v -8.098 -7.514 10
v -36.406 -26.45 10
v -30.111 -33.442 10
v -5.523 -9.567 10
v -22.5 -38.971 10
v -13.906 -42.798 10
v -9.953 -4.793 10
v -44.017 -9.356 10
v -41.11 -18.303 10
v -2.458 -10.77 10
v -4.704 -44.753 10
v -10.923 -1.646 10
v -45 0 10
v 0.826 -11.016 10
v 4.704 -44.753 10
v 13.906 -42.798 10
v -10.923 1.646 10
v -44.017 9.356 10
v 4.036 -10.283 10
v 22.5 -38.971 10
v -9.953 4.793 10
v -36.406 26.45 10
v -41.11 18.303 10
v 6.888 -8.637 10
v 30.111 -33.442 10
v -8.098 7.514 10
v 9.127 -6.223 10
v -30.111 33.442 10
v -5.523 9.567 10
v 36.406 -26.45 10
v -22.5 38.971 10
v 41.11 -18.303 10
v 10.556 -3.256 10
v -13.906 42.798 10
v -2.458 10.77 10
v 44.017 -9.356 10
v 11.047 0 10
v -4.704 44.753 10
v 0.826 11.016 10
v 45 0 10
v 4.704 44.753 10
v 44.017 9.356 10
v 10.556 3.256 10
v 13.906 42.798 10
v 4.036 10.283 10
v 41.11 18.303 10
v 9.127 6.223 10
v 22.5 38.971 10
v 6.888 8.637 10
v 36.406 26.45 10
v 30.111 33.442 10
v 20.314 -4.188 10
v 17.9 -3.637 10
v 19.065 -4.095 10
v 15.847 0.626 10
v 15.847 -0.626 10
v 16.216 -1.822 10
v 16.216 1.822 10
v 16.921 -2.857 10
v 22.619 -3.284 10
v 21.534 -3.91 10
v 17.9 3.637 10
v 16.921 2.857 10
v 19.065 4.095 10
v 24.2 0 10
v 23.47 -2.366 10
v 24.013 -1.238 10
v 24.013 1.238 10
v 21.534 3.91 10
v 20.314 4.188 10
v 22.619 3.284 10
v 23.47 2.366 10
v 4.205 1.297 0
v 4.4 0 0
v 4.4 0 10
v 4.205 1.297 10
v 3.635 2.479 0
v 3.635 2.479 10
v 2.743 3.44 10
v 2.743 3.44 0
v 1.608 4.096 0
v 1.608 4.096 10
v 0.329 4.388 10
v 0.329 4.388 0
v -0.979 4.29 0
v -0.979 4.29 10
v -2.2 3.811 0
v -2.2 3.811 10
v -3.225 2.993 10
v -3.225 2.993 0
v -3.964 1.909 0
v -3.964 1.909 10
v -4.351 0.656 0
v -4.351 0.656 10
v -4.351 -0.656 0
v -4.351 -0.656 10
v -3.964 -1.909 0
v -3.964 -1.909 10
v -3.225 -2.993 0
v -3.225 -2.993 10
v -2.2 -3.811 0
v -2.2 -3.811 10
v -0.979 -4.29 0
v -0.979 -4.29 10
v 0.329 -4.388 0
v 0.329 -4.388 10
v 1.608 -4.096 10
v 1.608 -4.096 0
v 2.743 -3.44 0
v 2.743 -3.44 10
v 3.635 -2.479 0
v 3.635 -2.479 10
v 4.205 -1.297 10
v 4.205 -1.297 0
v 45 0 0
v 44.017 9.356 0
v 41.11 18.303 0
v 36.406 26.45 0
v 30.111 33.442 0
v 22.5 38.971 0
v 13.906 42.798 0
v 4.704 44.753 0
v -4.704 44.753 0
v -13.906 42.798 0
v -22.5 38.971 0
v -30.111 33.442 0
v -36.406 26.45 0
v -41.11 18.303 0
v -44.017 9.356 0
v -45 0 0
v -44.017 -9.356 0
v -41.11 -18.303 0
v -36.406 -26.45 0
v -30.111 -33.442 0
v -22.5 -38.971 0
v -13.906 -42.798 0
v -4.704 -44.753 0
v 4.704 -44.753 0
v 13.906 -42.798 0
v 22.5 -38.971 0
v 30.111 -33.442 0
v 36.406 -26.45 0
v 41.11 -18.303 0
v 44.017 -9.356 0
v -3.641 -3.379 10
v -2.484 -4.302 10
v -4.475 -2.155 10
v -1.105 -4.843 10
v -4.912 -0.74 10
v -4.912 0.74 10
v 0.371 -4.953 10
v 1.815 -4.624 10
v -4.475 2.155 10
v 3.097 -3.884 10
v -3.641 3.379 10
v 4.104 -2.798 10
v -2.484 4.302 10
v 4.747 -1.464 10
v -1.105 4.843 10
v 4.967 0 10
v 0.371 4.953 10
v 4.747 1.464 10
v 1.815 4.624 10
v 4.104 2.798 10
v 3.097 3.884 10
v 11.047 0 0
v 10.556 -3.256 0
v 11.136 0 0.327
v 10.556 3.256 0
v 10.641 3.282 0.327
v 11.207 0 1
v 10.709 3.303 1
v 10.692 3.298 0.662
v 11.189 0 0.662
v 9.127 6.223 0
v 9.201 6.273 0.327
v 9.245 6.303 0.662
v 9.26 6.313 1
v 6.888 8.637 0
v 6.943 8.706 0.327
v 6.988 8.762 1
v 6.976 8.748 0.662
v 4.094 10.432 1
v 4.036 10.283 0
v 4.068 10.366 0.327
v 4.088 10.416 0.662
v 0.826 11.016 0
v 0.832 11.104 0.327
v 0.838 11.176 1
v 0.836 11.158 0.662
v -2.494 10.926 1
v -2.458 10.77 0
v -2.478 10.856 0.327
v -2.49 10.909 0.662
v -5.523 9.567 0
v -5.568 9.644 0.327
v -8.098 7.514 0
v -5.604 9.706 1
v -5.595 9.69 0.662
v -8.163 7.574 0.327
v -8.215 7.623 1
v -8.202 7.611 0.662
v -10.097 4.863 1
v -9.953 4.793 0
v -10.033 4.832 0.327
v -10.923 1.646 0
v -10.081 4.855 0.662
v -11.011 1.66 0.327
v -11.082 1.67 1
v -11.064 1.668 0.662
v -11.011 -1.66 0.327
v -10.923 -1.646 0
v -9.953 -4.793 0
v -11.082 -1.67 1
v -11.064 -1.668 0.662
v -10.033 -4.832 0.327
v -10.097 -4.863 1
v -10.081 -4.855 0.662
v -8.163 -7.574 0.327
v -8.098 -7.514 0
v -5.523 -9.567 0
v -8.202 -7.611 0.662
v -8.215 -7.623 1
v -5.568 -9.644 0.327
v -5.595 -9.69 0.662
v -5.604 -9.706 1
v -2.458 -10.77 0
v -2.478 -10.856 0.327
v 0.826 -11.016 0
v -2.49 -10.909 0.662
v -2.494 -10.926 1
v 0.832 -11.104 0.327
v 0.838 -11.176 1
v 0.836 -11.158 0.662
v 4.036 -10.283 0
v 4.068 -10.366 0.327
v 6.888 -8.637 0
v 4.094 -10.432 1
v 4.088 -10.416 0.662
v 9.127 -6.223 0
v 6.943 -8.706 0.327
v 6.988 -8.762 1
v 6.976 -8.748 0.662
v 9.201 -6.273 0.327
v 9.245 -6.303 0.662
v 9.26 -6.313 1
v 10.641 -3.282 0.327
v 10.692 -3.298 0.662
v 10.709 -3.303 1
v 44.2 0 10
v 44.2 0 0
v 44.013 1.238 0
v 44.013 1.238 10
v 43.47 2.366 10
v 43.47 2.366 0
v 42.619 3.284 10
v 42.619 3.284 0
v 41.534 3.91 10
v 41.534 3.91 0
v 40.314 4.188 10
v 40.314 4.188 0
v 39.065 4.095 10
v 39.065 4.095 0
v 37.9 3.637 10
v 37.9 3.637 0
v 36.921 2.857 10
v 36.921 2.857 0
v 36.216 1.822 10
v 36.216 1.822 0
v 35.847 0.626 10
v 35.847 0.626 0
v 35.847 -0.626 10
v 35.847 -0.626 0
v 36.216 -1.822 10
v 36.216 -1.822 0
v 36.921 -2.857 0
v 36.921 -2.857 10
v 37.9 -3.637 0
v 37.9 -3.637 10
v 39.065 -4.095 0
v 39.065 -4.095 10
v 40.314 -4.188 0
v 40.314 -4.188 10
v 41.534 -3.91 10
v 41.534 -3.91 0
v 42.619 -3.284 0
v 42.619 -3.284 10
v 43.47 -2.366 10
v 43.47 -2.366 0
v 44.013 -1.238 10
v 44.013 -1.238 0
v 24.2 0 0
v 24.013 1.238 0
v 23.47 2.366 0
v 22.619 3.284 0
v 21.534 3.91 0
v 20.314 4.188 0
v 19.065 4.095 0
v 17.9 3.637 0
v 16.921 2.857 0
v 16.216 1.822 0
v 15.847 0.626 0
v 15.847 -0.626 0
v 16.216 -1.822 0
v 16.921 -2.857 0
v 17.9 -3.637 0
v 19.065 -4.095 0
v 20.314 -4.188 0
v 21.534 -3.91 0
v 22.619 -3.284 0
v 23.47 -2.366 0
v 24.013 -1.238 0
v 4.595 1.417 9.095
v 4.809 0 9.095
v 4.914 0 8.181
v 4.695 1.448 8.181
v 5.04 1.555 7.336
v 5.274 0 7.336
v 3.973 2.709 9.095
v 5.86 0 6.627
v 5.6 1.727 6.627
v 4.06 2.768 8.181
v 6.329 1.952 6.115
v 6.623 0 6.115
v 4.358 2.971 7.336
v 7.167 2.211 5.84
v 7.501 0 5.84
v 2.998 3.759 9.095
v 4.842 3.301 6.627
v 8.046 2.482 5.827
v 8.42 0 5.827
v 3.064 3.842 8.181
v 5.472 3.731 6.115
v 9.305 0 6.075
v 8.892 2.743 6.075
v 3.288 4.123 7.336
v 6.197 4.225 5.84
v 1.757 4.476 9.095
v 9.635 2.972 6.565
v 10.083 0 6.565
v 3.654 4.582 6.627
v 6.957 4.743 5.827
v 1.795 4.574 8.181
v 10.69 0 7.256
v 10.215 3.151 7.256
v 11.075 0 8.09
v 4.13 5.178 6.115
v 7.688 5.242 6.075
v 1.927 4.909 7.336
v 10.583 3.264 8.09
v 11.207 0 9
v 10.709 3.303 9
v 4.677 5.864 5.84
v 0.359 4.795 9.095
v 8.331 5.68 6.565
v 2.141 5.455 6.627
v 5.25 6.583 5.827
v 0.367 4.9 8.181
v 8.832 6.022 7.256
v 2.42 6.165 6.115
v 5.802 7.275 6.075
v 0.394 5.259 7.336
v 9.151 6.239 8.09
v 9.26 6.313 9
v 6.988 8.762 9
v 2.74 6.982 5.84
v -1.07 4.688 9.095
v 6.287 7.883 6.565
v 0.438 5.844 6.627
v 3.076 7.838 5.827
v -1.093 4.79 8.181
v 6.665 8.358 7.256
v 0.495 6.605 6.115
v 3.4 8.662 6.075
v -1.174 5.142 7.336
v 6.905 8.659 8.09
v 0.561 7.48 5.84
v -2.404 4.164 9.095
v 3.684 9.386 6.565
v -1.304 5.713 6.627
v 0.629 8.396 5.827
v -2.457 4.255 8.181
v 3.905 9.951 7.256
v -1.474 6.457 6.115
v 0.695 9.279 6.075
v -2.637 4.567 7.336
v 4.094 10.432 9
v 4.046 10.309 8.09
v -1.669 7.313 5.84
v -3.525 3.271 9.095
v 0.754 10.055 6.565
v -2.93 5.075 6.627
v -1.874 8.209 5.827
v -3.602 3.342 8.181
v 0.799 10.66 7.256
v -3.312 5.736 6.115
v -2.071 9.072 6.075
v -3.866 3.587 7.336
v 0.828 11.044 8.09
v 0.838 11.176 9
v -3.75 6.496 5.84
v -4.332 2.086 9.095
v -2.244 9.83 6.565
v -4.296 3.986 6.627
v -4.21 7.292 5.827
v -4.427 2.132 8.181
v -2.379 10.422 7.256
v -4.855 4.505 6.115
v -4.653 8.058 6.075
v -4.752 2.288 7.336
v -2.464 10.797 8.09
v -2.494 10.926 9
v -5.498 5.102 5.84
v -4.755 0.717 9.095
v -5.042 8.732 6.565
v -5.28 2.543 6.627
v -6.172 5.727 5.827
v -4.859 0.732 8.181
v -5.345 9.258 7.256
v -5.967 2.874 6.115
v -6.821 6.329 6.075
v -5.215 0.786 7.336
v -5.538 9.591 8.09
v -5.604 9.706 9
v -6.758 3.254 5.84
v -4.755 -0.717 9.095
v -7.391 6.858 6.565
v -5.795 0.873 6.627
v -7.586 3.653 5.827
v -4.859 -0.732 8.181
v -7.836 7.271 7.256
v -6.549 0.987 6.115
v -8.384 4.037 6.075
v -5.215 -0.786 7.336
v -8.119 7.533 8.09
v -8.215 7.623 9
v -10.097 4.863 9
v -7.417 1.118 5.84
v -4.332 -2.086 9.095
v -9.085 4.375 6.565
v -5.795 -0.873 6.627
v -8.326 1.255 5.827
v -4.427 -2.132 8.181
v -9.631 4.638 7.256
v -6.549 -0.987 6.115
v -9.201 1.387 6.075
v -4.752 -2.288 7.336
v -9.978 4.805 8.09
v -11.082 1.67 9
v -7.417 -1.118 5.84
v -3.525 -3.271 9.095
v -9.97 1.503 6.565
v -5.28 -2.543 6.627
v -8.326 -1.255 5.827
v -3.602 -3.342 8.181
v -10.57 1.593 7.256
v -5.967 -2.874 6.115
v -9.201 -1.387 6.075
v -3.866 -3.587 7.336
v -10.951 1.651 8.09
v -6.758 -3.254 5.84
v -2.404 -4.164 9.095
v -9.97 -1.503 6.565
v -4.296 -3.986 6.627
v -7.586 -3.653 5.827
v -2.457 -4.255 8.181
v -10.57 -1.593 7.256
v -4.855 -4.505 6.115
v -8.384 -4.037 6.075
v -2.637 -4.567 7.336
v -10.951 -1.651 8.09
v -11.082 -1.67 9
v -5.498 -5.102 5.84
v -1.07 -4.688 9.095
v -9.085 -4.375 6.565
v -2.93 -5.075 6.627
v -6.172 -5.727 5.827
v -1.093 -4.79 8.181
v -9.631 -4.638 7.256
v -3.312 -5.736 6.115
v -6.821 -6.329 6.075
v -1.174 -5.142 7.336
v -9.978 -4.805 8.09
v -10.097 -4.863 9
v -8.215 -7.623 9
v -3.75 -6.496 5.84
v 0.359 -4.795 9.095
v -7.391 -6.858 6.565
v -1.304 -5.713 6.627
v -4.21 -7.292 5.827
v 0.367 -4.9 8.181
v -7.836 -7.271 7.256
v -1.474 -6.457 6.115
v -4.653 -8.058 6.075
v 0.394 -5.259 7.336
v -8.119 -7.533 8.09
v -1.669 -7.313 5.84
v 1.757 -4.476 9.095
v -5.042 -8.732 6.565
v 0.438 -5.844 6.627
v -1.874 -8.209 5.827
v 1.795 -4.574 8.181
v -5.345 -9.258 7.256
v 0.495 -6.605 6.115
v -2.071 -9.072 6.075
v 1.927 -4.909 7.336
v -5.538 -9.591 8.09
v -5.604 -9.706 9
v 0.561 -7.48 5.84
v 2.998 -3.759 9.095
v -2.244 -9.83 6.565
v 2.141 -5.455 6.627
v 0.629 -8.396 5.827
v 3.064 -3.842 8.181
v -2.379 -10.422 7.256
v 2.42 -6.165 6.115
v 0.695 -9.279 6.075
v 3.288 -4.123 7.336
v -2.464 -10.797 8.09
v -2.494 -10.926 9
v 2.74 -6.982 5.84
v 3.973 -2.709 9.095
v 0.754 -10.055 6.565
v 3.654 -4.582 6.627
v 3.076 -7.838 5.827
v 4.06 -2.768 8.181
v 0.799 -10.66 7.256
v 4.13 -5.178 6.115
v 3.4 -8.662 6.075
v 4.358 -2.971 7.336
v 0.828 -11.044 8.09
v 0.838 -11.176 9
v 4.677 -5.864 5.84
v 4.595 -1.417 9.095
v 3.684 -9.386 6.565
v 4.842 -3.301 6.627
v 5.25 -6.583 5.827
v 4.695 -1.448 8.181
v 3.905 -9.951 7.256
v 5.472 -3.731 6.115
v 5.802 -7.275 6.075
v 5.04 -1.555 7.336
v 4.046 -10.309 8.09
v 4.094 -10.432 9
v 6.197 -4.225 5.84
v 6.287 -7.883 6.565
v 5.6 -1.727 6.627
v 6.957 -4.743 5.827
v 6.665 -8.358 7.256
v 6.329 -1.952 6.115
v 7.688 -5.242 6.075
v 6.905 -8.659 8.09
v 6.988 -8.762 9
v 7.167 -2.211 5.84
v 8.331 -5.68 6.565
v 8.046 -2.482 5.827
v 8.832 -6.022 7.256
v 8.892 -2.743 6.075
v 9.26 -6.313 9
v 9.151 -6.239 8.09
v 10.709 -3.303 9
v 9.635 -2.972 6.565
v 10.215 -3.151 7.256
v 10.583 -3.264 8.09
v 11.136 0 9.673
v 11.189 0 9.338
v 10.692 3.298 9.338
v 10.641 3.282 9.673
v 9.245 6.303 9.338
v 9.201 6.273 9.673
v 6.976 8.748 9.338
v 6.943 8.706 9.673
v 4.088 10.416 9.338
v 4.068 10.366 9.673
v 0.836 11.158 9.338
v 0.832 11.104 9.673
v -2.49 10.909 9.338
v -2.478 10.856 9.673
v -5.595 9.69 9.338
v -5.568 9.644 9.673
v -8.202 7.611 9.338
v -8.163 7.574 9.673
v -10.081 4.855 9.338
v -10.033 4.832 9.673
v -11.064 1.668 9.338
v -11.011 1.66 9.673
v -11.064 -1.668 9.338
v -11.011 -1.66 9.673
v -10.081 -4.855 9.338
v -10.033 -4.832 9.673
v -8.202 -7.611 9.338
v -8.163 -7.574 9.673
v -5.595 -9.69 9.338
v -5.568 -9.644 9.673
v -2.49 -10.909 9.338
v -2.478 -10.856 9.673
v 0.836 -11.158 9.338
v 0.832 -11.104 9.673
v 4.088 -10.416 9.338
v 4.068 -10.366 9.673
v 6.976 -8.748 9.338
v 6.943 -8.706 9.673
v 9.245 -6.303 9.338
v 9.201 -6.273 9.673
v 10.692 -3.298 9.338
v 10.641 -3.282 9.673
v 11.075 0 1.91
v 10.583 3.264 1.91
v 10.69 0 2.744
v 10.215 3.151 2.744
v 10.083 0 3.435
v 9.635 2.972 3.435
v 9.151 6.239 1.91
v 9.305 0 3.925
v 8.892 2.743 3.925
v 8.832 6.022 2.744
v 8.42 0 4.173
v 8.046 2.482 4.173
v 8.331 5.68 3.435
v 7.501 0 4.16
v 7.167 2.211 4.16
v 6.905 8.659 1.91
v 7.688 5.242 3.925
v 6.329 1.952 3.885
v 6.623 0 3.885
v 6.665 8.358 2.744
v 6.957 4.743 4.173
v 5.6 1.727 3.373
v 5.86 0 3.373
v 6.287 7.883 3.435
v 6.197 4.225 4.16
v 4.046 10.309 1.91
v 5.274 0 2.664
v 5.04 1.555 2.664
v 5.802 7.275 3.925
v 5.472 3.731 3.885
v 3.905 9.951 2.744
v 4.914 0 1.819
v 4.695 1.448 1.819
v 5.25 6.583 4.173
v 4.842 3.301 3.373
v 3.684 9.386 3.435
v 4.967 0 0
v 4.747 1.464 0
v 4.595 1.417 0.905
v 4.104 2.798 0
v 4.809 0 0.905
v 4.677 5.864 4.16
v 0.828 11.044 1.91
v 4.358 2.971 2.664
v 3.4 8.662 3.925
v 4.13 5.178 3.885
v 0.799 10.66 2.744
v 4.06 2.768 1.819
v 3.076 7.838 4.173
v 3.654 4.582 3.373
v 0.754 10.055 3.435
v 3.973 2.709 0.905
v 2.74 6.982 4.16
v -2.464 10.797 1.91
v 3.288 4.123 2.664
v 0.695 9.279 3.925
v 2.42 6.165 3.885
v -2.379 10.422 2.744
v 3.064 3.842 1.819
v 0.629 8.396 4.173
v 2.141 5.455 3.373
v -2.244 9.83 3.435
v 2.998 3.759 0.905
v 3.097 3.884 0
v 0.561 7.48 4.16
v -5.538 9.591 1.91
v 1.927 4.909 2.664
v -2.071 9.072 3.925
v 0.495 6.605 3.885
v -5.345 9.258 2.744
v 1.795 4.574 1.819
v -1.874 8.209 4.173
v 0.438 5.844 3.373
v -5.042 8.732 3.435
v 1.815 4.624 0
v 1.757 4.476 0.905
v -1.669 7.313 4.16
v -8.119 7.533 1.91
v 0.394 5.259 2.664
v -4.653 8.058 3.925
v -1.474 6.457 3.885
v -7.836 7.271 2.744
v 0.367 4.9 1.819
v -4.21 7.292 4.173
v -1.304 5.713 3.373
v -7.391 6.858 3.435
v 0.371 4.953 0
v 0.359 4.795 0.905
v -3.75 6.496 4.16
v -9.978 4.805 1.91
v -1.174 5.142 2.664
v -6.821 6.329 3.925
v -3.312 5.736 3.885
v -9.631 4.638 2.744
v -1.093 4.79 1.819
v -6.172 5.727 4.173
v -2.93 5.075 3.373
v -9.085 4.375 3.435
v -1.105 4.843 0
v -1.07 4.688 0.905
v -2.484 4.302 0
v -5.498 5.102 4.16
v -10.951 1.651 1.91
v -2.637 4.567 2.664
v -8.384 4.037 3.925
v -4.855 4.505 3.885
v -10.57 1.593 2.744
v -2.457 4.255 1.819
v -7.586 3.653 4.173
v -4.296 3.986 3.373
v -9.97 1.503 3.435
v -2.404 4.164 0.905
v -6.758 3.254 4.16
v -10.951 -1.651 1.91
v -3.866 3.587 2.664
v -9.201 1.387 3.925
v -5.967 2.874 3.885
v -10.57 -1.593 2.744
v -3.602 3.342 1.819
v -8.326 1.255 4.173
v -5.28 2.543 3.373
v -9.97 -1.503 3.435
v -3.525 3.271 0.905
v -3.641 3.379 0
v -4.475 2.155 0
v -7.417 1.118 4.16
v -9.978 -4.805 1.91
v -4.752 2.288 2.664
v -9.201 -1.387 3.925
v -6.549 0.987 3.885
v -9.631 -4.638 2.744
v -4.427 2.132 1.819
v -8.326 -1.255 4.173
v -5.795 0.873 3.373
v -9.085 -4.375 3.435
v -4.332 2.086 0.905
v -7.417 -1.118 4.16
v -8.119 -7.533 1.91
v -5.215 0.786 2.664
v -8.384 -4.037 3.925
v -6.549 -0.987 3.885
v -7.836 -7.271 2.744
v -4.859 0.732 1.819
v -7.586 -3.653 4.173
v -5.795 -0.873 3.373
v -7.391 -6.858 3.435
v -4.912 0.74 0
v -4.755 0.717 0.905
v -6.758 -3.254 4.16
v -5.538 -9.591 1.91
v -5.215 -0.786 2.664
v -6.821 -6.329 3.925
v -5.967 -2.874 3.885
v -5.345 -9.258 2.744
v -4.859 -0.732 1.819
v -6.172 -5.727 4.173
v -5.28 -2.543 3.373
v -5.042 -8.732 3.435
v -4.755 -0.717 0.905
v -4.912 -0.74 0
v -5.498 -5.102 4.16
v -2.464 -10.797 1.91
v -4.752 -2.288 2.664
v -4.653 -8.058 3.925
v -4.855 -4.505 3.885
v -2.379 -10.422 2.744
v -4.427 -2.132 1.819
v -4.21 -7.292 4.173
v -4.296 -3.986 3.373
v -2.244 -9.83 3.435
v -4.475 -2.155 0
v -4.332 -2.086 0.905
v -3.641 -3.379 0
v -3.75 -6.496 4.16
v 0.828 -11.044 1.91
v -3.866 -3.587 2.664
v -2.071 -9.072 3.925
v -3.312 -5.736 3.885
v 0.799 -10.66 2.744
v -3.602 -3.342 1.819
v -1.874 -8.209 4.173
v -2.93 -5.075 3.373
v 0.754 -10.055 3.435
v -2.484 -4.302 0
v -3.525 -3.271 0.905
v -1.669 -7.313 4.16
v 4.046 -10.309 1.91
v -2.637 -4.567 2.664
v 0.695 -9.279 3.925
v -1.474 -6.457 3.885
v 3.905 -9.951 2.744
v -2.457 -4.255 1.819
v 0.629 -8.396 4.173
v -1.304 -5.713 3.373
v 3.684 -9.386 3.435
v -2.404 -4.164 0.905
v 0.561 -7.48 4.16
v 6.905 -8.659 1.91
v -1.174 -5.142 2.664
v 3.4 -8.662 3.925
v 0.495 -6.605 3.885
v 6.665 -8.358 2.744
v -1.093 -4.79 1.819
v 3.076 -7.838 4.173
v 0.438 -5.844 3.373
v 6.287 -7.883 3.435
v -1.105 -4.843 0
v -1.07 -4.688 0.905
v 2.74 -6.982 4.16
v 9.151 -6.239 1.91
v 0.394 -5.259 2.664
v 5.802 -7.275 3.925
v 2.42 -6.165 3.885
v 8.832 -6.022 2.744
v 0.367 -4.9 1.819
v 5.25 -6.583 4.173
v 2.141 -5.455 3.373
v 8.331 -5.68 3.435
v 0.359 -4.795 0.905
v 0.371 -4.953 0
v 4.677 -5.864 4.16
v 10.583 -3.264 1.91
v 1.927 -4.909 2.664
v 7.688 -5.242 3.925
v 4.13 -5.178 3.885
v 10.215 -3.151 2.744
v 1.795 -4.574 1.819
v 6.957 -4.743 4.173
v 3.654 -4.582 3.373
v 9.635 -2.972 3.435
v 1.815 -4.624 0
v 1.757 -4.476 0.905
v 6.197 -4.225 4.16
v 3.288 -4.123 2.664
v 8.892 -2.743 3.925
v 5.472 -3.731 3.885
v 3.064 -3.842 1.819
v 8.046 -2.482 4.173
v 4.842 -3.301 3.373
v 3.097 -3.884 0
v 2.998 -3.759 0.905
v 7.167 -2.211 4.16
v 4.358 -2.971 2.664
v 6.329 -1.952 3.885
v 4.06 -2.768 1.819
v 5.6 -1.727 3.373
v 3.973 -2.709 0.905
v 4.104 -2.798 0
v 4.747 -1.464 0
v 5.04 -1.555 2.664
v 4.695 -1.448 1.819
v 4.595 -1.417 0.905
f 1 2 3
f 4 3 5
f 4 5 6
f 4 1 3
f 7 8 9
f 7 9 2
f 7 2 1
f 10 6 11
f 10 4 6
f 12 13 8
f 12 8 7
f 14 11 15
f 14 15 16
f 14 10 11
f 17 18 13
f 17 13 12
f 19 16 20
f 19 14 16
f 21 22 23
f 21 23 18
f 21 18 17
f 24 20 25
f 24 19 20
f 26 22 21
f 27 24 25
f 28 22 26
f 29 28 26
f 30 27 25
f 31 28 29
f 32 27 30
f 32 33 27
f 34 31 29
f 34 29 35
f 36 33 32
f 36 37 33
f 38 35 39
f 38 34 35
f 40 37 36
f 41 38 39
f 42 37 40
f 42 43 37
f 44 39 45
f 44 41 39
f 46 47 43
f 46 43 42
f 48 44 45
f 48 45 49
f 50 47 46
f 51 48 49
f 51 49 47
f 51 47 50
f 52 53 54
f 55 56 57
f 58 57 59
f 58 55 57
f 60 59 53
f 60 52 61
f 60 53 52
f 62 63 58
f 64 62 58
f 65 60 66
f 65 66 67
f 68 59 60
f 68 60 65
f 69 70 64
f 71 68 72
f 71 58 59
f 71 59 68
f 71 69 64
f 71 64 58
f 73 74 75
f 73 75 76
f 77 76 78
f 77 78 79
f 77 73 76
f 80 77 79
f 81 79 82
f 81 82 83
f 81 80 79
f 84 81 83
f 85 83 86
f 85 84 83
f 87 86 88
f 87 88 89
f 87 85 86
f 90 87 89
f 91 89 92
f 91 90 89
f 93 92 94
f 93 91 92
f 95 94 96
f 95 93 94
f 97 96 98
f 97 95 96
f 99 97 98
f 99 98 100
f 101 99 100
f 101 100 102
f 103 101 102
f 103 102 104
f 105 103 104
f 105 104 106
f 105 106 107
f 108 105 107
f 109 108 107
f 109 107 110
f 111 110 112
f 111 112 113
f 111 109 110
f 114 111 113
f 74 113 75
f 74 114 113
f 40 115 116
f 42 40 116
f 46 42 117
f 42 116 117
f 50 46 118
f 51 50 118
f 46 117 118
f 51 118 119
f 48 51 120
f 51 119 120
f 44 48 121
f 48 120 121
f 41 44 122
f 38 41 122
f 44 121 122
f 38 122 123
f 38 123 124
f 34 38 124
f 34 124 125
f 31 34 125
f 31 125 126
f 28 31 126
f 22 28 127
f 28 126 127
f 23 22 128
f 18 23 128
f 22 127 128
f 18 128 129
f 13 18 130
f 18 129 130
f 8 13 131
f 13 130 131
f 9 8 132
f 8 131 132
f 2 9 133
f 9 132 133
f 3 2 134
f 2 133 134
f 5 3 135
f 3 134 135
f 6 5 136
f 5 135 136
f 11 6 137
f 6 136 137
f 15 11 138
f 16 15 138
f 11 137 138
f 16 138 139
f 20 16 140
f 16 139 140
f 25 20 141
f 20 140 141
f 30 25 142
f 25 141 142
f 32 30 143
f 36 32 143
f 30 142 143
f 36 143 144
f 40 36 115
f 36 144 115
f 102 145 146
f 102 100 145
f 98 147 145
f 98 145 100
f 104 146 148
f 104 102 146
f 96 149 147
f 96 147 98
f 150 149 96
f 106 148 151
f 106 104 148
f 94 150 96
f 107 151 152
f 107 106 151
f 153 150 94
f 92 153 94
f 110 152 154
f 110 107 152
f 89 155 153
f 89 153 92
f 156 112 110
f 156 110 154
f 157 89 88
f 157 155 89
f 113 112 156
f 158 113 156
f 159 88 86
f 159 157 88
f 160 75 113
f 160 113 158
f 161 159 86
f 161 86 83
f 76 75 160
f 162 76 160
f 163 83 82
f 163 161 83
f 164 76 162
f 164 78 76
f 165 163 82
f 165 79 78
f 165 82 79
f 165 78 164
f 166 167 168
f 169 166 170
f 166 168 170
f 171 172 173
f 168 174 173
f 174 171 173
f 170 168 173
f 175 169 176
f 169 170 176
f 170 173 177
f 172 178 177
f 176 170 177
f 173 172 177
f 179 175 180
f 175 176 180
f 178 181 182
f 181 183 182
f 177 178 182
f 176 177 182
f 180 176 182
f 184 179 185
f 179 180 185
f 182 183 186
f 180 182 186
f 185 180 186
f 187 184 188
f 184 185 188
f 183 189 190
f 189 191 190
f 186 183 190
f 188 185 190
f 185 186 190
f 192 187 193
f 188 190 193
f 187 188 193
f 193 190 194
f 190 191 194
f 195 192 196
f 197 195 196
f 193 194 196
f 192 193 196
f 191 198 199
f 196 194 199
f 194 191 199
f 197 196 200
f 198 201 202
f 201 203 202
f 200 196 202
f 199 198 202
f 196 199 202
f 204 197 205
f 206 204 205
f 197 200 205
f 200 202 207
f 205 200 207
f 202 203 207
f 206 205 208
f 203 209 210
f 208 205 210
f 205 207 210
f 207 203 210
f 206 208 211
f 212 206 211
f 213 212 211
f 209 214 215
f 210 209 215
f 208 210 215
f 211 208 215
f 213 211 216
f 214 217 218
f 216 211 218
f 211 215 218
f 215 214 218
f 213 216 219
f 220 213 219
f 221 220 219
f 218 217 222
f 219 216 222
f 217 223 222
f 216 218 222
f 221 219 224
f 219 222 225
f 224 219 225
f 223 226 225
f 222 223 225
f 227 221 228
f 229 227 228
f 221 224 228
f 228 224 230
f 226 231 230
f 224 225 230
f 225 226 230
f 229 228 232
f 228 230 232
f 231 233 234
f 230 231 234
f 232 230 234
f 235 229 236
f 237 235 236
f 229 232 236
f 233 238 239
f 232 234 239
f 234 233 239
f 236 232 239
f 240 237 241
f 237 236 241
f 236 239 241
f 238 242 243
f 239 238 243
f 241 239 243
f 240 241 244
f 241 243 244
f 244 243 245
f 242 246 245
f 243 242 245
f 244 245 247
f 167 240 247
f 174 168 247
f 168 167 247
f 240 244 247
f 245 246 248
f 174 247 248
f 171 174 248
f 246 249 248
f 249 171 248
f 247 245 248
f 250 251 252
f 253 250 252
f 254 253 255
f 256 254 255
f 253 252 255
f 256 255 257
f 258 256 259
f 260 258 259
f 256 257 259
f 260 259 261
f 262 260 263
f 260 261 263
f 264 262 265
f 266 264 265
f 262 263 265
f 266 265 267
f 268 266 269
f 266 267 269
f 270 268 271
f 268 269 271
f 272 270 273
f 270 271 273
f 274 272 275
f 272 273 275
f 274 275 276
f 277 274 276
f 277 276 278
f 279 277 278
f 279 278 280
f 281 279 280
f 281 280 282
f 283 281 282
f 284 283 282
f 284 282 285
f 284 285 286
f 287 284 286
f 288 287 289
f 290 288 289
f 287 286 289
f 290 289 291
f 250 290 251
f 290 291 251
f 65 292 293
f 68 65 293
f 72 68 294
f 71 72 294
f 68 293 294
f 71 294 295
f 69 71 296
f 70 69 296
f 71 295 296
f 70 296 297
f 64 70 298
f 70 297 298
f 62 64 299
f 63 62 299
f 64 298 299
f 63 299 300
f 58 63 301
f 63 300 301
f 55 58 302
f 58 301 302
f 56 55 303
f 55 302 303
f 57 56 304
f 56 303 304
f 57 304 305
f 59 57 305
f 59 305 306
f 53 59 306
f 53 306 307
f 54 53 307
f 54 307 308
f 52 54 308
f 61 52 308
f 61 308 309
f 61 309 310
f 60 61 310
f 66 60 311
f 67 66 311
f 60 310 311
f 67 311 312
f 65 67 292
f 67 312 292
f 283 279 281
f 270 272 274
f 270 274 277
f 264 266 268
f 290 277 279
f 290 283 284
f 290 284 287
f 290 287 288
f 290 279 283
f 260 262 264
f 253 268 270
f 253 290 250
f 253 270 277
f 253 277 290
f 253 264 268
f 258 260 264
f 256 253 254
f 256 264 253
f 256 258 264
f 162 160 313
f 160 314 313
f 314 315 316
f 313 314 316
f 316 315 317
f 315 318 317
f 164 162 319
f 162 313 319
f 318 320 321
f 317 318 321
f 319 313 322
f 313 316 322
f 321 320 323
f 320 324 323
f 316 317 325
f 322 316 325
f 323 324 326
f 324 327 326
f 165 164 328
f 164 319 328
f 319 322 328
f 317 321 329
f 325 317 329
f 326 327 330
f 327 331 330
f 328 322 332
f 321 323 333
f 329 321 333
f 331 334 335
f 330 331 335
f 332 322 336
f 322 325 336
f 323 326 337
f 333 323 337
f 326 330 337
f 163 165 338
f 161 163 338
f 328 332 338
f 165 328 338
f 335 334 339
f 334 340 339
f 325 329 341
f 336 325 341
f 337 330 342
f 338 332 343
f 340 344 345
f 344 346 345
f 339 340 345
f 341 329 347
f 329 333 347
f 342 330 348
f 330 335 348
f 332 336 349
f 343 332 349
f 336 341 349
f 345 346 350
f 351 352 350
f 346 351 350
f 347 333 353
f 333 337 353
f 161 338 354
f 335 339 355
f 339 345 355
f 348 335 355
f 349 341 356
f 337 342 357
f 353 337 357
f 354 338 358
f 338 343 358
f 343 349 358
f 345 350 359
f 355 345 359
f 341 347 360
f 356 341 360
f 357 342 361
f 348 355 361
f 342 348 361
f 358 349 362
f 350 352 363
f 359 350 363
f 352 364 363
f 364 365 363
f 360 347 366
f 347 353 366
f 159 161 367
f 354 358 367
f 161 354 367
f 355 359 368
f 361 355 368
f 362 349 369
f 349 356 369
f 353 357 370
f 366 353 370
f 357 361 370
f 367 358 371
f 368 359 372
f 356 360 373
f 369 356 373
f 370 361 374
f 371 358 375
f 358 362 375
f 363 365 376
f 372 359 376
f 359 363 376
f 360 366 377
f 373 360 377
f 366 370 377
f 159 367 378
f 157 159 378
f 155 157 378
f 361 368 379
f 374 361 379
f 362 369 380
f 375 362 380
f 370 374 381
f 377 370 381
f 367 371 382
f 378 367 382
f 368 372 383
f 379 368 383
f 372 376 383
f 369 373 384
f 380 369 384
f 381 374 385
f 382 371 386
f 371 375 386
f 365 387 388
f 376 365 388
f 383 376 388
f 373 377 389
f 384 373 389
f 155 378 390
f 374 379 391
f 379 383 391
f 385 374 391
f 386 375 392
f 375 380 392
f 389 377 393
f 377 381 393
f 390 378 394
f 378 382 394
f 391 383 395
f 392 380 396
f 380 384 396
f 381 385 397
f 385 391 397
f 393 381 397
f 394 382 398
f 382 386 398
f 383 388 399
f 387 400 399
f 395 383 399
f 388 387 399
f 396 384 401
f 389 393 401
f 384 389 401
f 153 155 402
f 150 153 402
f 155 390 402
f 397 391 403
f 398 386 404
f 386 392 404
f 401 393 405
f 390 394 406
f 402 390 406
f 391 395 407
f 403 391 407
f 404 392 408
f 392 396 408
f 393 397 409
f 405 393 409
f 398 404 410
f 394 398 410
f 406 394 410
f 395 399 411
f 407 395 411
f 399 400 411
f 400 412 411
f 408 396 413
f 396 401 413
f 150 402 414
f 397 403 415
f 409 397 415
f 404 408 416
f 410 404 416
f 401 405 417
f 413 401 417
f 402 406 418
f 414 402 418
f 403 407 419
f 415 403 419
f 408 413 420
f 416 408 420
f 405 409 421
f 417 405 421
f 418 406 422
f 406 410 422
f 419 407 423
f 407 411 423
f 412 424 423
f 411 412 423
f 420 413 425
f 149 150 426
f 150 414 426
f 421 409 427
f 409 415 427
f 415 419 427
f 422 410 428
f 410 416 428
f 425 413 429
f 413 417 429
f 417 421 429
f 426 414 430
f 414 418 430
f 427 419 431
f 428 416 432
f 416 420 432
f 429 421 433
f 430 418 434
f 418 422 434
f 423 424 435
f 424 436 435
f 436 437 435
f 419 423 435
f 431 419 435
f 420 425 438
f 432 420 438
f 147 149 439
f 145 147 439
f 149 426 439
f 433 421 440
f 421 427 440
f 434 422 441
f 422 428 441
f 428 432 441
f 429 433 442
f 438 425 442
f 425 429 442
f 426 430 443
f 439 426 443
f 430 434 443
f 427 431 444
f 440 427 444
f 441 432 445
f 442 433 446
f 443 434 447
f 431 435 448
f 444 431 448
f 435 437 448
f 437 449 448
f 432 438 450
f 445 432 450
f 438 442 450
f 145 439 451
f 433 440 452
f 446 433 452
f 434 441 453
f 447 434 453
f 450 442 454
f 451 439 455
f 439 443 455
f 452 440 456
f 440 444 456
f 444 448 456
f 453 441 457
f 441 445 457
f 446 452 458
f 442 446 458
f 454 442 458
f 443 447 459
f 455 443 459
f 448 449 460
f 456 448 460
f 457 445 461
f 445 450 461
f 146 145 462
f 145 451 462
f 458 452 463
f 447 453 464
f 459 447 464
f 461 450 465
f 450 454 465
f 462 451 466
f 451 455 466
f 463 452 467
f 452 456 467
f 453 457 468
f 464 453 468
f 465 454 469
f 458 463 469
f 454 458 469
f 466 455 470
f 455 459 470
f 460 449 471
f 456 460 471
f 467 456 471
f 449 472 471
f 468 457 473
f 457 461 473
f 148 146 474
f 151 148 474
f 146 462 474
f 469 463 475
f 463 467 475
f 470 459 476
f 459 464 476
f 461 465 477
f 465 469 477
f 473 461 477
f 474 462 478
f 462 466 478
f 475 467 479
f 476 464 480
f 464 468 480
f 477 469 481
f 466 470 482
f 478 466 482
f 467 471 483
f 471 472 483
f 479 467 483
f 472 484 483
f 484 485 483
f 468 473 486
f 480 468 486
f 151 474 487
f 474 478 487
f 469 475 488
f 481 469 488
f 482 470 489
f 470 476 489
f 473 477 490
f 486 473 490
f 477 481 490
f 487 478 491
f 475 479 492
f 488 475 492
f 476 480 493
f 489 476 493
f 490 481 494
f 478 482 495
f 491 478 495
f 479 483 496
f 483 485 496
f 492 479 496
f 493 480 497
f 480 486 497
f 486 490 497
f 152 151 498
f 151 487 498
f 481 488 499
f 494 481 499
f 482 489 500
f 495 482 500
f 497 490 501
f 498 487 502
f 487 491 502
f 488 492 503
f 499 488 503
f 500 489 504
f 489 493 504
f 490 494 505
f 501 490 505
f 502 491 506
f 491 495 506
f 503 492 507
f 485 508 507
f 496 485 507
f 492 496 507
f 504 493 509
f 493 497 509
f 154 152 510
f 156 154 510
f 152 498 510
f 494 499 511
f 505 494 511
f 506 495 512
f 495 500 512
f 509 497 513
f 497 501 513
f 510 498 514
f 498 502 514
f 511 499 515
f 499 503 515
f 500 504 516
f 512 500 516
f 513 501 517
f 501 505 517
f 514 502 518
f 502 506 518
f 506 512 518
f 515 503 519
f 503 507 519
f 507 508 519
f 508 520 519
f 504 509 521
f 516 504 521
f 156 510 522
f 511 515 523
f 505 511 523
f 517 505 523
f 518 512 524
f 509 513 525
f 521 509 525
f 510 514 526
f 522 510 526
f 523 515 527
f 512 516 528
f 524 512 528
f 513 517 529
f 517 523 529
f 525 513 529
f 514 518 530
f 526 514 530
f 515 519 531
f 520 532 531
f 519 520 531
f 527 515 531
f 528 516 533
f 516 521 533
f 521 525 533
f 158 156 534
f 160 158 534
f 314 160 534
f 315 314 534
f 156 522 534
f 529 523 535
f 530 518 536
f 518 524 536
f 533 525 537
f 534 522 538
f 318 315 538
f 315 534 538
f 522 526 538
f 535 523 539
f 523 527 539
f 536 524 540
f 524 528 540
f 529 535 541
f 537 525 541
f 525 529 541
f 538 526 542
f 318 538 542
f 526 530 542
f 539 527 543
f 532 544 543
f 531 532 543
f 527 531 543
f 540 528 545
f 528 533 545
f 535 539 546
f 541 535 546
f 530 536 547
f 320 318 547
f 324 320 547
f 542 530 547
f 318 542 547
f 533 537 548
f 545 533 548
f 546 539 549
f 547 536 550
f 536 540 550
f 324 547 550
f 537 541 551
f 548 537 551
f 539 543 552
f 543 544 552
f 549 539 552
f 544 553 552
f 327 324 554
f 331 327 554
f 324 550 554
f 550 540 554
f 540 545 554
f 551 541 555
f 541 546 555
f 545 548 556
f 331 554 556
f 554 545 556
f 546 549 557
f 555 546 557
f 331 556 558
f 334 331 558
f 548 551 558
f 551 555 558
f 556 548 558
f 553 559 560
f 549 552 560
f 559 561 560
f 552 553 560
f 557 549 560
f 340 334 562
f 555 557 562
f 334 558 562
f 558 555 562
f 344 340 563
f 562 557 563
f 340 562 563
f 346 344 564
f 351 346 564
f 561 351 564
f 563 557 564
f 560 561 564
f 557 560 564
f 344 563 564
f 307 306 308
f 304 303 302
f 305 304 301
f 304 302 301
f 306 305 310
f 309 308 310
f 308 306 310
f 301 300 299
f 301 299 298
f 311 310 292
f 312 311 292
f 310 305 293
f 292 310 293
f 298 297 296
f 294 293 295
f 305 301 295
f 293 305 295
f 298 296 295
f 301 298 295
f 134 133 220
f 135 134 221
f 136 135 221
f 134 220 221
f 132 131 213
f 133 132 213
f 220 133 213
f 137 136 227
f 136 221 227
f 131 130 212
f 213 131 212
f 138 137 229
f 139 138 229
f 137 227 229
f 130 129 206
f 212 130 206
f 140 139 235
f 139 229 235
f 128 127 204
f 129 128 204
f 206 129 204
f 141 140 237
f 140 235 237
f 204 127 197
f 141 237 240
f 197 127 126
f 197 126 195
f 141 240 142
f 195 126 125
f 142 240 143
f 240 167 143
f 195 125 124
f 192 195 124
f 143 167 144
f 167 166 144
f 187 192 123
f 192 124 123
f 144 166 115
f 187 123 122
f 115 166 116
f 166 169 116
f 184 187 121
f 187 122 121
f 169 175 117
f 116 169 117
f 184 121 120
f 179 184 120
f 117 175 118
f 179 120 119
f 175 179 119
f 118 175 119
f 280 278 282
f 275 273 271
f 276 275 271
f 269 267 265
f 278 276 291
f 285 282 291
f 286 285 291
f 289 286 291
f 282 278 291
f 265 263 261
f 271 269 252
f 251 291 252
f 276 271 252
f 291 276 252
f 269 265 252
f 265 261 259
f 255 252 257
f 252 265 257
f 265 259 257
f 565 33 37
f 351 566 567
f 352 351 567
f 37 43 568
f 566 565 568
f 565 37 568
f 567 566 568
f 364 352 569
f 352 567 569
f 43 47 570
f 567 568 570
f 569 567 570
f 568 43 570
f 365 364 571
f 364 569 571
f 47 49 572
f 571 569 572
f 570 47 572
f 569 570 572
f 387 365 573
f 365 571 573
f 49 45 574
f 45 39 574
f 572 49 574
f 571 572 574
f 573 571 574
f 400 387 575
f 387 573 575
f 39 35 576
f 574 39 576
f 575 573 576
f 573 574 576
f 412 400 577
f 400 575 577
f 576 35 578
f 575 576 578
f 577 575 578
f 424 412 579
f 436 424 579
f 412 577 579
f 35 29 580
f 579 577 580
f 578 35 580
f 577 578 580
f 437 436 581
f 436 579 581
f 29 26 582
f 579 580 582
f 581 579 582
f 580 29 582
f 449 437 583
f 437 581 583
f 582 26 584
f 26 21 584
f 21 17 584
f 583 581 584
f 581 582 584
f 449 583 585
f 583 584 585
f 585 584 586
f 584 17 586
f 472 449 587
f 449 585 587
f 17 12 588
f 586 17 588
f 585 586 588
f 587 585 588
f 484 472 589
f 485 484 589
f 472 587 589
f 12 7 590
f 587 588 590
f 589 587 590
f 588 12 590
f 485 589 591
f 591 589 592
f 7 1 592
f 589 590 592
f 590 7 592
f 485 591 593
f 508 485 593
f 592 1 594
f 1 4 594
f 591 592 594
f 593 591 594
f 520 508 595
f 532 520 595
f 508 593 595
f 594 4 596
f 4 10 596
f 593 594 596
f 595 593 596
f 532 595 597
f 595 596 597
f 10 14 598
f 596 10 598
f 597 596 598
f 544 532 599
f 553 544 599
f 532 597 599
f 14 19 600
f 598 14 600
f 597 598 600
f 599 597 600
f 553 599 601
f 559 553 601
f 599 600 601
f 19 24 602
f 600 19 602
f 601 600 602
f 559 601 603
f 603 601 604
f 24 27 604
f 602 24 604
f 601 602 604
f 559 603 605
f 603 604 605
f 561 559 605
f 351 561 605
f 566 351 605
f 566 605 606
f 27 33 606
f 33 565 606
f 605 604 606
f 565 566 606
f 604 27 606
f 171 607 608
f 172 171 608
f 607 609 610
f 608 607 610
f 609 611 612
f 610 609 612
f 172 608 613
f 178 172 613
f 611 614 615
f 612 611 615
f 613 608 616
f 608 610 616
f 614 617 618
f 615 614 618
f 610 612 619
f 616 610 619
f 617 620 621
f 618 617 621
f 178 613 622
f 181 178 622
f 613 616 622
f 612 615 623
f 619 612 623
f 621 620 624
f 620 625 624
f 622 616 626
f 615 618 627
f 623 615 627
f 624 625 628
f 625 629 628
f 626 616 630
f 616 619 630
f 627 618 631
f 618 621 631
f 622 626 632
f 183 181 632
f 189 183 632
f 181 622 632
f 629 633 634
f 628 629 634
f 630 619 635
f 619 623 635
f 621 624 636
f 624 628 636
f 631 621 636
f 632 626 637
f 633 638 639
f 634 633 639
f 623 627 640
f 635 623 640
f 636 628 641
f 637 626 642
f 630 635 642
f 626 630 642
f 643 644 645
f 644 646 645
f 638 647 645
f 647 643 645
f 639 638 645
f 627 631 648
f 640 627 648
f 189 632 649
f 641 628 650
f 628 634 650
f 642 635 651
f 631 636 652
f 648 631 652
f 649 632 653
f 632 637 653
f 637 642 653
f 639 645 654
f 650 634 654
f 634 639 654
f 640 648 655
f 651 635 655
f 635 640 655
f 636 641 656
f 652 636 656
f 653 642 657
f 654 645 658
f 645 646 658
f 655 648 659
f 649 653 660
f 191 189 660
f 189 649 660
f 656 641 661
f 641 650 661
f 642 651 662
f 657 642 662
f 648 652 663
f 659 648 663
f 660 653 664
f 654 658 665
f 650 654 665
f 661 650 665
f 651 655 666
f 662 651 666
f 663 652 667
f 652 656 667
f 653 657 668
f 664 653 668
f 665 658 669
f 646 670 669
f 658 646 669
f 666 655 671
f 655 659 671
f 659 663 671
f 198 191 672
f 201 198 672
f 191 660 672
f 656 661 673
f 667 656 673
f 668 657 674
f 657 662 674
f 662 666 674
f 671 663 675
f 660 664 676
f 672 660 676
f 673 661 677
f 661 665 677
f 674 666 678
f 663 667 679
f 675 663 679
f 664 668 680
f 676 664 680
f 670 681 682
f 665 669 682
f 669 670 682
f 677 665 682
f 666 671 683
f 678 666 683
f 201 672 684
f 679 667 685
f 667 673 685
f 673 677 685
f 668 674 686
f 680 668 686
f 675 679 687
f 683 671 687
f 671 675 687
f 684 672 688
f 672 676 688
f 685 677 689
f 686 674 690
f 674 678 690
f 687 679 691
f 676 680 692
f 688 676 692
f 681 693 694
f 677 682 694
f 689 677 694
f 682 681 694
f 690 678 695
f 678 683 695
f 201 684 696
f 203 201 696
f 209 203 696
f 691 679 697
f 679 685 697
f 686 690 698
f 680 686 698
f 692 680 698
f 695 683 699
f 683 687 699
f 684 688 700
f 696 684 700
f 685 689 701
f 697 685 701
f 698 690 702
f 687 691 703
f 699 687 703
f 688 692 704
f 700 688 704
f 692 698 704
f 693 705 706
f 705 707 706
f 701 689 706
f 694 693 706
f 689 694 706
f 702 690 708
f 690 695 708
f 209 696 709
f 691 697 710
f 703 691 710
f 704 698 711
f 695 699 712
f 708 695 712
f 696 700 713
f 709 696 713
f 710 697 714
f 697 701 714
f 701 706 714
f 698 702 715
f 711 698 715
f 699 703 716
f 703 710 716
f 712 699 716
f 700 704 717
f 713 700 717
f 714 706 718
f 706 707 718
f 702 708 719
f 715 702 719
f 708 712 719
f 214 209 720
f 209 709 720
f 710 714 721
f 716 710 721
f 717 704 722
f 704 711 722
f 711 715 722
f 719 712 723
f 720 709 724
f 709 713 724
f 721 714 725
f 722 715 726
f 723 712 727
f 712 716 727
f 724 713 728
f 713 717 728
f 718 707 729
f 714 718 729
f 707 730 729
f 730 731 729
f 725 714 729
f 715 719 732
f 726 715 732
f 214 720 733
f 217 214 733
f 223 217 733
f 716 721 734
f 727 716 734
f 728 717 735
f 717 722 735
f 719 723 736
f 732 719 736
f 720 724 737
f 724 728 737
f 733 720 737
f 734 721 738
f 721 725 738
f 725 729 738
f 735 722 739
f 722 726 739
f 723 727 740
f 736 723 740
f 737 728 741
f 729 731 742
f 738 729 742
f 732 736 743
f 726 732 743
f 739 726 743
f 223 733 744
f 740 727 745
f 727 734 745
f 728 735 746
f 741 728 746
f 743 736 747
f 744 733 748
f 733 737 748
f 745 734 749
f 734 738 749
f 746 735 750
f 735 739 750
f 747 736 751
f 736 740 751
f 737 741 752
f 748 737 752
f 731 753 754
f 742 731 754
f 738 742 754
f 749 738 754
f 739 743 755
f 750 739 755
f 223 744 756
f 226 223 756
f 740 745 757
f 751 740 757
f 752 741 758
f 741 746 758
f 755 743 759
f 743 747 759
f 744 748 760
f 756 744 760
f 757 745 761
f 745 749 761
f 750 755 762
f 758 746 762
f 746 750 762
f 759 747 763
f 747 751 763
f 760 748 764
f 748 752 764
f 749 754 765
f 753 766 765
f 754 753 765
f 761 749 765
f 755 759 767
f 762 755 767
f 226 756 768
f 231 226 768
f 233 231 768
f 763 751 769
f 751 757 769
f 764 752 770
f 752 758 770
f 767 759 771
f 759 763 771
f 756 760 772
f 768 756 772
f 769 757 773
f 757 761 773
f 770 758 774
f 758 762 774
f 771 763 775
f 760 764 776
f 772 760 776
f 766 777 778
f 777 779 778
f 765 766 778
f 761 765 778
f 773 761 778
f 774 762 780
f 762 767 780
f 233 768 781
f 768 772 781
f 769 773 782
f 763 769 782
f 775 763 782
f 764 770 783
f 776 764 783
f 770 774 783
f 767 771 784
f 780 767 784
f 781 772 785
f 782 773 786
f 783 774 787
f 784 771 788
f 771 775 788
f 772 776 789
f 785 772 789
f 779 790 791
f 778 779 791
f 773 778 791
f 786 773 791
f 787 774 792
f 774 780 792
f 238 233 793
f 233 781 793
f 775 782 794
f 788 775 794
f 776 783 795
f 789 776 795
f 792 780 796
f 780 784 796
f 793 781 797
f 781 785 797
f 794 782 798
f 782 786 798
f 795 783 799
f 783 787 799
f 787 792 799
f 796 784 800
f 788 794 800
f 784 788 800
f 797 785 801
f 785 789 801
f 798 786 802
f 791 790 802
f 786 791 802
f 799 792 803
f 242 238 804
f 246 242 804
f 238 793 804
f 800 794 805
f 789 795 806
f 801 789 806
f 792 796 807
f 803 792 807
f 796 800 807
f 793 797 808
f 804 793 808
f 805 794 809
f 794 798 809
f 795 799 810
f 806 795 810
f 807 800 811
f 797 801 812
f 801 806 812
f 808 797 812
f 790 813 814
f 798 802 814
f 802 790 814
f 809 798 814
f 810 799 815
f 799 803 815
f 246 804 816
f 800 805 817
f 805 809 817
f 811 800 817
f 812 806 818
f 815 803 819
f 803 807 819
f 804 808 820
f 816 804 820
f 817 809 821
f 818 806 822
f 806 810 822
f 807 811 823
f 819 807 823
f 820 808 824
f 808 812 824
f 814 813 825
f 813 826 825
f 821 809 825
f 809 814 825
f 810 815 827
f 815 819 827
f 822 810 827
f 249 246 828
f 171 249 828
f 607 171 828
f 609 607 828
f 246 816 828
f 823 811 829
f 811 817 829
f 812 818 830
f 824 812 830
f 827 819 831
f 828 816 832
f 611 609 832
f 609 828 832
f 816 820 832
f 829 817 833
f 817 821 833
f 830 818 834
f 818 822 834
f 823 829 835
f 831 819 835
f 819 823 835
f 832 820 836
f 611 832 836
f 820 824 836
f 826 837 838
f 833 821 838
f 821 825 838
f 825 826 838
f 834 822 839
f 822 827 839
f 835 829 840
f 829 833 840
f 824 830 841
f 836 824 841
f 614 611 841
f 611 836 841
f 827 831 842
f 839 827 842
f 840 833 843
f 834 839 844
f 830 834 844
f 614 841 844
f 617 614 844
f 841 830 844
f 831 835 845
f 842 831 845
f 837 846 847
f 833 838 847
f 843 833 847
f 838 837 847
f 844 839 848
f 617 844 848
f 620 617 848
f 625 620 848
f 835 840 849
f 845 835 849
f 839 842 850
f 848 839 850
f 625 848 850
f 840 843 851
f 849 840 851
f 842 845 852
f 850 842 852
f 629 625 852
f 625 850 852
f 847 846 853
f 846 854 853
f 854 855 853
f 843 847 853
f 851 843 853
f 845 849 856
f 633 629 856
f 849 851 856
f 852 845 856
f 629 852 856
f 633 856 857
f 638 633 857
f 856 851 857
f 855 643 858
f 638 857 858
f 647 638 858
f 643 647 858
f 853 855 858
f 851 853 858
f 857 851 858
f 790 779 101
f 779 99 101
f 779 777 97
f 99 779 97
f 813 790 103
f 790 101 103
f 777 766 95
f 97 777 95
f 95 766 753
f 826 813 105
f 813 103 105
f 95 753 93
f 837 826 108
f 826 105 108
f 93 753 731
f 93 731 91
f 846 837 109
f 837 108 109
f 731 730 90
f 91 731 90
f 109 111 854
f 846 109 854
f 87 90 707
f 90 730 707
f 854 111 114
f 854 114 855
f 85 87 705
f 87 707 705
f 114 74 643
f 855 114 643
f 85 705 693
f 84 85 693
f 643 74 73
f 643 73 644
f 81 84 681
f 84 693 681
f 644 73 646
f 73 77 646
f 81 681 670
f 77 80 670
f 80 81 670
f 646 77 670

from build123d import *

# Parameters (mm, degrees)
CYLINDER001_R                        = 4.4
CYLINDER001_DEPTH                    = 10
SKETCH002_AS_DRAWN_R                 = 3.2
REVOLVE001_ONTO_SKETCH002_ROLL_ANGLE = 90
SKETCH001_AS_DRAWN_R                 = 3.2
REVOLVE_ONTO_SKETCH001_ROLL_ANGLE    = 90
CYLINDER_R                           = 45
CYLINDER_DEPTH                       = 10
CYLINDER002_R                        = 4.2
CYLINDER002_DEPTH                    = 10
CYLINDER003_R                        = 4.2
CYLINDER003_DEPTH                    = 10


with BuildPart() as cylinder001:
    # Cylinder001 → Cylinder001 (new body)
    with BuildSketch(Plane.XY):
        Circle(CYLINDER001_R)
    extrude(amount=CYLINDER001_DEPTH)


with BuildPart() as revolve001:
    # Sketch002 as drawn → Revolve001 (revolve)
    with BuildSketch(Plane.XY):
        with Locations((8.007105, 0)):
            Circle(SKETCH002_AS_DRAWN_R)
    revolve(axis=Axis((0, 0, 0), (0, 1, 0)))


with BuildPart() as revolve001_1:
    # Revolve001 onto Sketch002 roll: moved
    add(revolve001.part.rotate(Axis((0, 0, 0), (1, 0, 0)), REVOLVE001_ONTO_SKETCH002_ROLL_ANGLE))


with BuildPart() as revolve001_2:
    # Revolve001 onto Sketch002 placement: moved
    add(revolve001_1.part)


with BuildPart() as revolve001_3:
    # Revolve001 placement: moved
    add(revolve001_2.part.moved(Location((0, 0, 9))))


with BuildPart() as revolve_body:
    # Sketch001 as drawn → Revolve (revolve)
    with BuildSketch(Plane.XY):
        with Locations((8.007105, 0)):
            Circle(SKETCH001_AS_DRAWN_R)
    revolve(axis=Axis((0, 0, 0), (0, 1, 0)))


with BuildPart() as revolve_body_1:
    # Revolve onto Sketch001 roll: moved
    add(revolve_body.part.rotate(Axis((0, 0, 0), (1, 0, 0)), REVOLVE_ONTO_SKETCH001_ROLL_ANGLE))


with BuildPart() as revolve_body_2:
    # Revolve onto Sketch001 placement: moved
    add(revolve_body_1.part)


with BuildPart() as revolve_body_3:
    # Revolve placement: moved
    add(revolve_body_2.part.moved(Location((0, 0, 1))))


with BuildPart() as cut002:
    # Cylinder → Cylinder (new body)
    with BuildSketch(Plane.XY):
        Circle(CYLINDER_R)
    extrude(amount=CYLINDER_DEPTH)

    # Cut: cut Revolve body
    add(revolve_body_3.part, mode=Mode.SUBTRACT)

    # Cut001: cut Revolve001
    add(revolve001_3.part, mode=Mode.SUBTRACT)

    # Cut002: cut Cylinder001
    add(cylinder001.part, mode=Mode.SUBTRACT)


with BuildPart() as cylinder002:
    # Cylinder002 → Cylinder002 (new body)
    with BuildSketch(Plane(origin=(40, 0, 0), x_dir=(1, 0, 0), z_dir=(0, 0, 1))):
        Circle(CYLINDER002_R)
    extrude(amount=CYLINDER002_DEPTH)


with BuildPart() as cylinder003:
    # Cylinder003 → Cylinder003 (new body)
    with BuildSketch(Plane(origin=(20, 0, 0), x_dir=(1, 0, 0), z_dir=(0, 0, 1))):
        Circle(CYLINDER003_R)
    extrude(amount=CYLINDER003_DEPTH)


solid = Compound([cut002.part, cylinder002.part, cylinder003.part])
